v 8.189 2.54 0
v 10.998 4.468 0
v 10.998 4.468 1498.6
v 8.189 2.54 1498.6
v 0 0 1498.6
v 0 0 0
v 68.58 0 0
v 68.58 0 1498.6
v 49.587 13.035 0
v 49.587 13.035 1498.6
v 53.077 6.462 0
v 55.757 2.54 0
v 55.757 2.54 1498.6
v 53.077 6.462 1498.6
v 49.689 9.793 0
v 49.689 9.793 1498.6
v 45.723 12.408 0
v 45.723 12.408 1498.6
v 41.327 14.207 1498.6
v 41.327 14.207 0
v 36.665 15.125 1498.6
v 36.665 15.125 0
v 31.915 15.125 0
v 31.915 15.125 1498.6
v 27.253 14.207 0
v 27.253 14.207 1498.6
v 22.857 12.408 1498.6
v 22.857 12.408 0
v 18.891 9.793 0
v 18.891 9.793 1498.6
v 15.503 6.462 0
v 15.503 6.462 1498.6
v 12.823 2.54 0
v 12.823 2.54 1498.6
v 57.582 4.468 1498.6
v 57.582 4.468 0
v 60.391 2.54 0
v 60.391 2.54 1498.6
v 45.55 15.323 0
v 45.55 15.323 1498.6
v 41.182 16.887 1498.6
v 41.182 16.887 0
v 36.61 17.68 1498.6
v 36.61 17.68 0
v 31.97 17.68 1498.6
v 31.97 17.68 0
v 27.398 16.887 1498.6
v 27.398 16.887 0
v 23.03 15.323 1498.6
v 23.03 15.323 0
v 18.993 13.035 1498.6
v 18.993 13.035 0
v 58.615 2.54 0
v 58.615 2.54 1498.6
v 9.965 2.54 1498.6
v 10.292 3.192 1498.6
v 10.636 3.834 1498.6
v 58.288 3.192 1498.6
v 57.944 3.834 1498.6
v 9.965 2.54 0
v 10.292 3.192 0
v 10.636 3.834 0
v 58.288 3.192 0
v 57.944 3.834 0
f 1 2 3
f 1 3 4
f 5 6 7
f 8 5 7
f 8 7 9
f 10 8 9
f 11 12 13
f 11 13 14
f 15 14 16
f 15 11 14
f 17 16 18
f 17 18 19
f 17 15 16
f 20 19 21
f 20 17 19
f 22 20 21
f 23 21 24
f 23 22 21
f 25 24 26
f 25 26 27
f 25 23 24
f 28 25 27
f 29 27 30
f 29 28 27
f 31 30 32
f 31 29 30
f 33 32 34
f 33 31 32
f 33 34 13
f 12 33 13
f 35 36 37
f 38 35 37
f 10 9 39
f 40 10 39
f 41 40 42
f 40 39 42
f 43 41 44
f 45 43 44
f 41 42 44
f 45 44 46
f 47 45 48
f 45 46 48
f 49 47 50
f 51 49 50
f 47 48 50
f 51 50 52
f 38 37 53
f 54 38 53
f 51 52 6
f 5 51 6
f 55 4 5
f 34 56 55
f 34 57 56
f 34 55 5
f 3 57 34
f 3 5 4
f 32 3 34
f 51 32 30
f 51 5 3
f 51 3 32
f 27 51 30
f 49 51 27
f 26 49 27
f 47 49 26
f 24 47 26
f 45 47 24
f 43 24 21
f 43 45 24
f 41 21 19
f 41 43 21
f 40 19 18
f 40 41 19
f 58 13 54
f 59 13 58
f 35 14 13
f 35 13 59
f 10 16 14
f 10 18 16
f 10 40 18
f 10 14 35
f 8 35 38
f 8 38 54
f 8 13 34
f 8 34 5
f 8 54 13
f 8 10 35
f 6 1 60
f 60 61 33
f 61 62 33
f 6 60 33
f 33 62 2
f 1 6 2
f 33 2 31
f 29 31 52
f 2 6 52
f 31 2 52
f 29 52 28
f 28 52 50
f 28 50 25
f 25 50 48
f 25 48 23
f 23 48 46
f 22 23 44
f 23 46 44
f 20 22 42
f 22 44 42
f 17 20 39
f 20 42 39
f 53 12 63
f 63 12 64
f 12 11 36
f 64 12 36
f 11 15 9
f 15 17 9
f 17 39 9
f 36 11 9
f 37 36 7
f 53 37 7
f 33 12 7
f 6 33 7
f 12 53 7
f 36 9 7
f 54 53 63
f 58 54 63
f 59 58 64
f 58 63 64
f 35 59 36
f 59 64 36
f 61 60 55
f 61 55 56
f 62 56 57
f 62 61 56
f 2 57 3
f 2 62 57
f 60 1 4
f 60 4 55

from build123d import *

# Parameters (mm, degrees)
BOSS_EXTRUDE1_DEPTH = 1498.6


with BuildPart() as part:
    # Sketch2 → Boss-Extrude1 (new body)
    with BuildSketch(Plane.XY):
        with BuildLine():
            Line((0, 0), (68.58, 0))
            Line((68.58, 0), (49.587320143, 13.03542143))
            ThreePointArc((49.587320143, 13.03542143), (34.29, 17.78), (18.992679857, 13.03542143))
            Line((18.992679857, 13.03542143), (0, 0))
        make_face()
        with BuildLine():
            Line((10.997802271, 4.46752515), (8.189387654, 2.54))
            Line((8.189387654, 2.54), (9.965035751, 2.54))
            ThreePointArc((9.965035751, 2.54), (10.461920618, 3.514209799), (10.997802271, 4.46752515))
        make_face(mode=Mode.SUBTRACT)
        with BuildLine():
            Line((57.582197729, 4.46752515), (60.390612346, 2.54))
            Line((60.390612346, 2.54), (58.614964249, 2.54))
            ThreePointArc((58.614964249, 2.54), (58.118079382, 3.514209799), (57.582197729, 4.46752515))
        make_face(mode=Mode.SUBTRACT)
        with BuildLine():
            Line((12.82308193, 2.54), (55.75691807, 2.54))
            ThreePointArc((55.75691807, 2.54), (34.29, 15.24), (12.82308193, 2.54))
        make_face(mode=Mode.SUBTRACT)
    extrude(amount=BOSS_EXTRUDE1_DEPTH)


solid = part.part
